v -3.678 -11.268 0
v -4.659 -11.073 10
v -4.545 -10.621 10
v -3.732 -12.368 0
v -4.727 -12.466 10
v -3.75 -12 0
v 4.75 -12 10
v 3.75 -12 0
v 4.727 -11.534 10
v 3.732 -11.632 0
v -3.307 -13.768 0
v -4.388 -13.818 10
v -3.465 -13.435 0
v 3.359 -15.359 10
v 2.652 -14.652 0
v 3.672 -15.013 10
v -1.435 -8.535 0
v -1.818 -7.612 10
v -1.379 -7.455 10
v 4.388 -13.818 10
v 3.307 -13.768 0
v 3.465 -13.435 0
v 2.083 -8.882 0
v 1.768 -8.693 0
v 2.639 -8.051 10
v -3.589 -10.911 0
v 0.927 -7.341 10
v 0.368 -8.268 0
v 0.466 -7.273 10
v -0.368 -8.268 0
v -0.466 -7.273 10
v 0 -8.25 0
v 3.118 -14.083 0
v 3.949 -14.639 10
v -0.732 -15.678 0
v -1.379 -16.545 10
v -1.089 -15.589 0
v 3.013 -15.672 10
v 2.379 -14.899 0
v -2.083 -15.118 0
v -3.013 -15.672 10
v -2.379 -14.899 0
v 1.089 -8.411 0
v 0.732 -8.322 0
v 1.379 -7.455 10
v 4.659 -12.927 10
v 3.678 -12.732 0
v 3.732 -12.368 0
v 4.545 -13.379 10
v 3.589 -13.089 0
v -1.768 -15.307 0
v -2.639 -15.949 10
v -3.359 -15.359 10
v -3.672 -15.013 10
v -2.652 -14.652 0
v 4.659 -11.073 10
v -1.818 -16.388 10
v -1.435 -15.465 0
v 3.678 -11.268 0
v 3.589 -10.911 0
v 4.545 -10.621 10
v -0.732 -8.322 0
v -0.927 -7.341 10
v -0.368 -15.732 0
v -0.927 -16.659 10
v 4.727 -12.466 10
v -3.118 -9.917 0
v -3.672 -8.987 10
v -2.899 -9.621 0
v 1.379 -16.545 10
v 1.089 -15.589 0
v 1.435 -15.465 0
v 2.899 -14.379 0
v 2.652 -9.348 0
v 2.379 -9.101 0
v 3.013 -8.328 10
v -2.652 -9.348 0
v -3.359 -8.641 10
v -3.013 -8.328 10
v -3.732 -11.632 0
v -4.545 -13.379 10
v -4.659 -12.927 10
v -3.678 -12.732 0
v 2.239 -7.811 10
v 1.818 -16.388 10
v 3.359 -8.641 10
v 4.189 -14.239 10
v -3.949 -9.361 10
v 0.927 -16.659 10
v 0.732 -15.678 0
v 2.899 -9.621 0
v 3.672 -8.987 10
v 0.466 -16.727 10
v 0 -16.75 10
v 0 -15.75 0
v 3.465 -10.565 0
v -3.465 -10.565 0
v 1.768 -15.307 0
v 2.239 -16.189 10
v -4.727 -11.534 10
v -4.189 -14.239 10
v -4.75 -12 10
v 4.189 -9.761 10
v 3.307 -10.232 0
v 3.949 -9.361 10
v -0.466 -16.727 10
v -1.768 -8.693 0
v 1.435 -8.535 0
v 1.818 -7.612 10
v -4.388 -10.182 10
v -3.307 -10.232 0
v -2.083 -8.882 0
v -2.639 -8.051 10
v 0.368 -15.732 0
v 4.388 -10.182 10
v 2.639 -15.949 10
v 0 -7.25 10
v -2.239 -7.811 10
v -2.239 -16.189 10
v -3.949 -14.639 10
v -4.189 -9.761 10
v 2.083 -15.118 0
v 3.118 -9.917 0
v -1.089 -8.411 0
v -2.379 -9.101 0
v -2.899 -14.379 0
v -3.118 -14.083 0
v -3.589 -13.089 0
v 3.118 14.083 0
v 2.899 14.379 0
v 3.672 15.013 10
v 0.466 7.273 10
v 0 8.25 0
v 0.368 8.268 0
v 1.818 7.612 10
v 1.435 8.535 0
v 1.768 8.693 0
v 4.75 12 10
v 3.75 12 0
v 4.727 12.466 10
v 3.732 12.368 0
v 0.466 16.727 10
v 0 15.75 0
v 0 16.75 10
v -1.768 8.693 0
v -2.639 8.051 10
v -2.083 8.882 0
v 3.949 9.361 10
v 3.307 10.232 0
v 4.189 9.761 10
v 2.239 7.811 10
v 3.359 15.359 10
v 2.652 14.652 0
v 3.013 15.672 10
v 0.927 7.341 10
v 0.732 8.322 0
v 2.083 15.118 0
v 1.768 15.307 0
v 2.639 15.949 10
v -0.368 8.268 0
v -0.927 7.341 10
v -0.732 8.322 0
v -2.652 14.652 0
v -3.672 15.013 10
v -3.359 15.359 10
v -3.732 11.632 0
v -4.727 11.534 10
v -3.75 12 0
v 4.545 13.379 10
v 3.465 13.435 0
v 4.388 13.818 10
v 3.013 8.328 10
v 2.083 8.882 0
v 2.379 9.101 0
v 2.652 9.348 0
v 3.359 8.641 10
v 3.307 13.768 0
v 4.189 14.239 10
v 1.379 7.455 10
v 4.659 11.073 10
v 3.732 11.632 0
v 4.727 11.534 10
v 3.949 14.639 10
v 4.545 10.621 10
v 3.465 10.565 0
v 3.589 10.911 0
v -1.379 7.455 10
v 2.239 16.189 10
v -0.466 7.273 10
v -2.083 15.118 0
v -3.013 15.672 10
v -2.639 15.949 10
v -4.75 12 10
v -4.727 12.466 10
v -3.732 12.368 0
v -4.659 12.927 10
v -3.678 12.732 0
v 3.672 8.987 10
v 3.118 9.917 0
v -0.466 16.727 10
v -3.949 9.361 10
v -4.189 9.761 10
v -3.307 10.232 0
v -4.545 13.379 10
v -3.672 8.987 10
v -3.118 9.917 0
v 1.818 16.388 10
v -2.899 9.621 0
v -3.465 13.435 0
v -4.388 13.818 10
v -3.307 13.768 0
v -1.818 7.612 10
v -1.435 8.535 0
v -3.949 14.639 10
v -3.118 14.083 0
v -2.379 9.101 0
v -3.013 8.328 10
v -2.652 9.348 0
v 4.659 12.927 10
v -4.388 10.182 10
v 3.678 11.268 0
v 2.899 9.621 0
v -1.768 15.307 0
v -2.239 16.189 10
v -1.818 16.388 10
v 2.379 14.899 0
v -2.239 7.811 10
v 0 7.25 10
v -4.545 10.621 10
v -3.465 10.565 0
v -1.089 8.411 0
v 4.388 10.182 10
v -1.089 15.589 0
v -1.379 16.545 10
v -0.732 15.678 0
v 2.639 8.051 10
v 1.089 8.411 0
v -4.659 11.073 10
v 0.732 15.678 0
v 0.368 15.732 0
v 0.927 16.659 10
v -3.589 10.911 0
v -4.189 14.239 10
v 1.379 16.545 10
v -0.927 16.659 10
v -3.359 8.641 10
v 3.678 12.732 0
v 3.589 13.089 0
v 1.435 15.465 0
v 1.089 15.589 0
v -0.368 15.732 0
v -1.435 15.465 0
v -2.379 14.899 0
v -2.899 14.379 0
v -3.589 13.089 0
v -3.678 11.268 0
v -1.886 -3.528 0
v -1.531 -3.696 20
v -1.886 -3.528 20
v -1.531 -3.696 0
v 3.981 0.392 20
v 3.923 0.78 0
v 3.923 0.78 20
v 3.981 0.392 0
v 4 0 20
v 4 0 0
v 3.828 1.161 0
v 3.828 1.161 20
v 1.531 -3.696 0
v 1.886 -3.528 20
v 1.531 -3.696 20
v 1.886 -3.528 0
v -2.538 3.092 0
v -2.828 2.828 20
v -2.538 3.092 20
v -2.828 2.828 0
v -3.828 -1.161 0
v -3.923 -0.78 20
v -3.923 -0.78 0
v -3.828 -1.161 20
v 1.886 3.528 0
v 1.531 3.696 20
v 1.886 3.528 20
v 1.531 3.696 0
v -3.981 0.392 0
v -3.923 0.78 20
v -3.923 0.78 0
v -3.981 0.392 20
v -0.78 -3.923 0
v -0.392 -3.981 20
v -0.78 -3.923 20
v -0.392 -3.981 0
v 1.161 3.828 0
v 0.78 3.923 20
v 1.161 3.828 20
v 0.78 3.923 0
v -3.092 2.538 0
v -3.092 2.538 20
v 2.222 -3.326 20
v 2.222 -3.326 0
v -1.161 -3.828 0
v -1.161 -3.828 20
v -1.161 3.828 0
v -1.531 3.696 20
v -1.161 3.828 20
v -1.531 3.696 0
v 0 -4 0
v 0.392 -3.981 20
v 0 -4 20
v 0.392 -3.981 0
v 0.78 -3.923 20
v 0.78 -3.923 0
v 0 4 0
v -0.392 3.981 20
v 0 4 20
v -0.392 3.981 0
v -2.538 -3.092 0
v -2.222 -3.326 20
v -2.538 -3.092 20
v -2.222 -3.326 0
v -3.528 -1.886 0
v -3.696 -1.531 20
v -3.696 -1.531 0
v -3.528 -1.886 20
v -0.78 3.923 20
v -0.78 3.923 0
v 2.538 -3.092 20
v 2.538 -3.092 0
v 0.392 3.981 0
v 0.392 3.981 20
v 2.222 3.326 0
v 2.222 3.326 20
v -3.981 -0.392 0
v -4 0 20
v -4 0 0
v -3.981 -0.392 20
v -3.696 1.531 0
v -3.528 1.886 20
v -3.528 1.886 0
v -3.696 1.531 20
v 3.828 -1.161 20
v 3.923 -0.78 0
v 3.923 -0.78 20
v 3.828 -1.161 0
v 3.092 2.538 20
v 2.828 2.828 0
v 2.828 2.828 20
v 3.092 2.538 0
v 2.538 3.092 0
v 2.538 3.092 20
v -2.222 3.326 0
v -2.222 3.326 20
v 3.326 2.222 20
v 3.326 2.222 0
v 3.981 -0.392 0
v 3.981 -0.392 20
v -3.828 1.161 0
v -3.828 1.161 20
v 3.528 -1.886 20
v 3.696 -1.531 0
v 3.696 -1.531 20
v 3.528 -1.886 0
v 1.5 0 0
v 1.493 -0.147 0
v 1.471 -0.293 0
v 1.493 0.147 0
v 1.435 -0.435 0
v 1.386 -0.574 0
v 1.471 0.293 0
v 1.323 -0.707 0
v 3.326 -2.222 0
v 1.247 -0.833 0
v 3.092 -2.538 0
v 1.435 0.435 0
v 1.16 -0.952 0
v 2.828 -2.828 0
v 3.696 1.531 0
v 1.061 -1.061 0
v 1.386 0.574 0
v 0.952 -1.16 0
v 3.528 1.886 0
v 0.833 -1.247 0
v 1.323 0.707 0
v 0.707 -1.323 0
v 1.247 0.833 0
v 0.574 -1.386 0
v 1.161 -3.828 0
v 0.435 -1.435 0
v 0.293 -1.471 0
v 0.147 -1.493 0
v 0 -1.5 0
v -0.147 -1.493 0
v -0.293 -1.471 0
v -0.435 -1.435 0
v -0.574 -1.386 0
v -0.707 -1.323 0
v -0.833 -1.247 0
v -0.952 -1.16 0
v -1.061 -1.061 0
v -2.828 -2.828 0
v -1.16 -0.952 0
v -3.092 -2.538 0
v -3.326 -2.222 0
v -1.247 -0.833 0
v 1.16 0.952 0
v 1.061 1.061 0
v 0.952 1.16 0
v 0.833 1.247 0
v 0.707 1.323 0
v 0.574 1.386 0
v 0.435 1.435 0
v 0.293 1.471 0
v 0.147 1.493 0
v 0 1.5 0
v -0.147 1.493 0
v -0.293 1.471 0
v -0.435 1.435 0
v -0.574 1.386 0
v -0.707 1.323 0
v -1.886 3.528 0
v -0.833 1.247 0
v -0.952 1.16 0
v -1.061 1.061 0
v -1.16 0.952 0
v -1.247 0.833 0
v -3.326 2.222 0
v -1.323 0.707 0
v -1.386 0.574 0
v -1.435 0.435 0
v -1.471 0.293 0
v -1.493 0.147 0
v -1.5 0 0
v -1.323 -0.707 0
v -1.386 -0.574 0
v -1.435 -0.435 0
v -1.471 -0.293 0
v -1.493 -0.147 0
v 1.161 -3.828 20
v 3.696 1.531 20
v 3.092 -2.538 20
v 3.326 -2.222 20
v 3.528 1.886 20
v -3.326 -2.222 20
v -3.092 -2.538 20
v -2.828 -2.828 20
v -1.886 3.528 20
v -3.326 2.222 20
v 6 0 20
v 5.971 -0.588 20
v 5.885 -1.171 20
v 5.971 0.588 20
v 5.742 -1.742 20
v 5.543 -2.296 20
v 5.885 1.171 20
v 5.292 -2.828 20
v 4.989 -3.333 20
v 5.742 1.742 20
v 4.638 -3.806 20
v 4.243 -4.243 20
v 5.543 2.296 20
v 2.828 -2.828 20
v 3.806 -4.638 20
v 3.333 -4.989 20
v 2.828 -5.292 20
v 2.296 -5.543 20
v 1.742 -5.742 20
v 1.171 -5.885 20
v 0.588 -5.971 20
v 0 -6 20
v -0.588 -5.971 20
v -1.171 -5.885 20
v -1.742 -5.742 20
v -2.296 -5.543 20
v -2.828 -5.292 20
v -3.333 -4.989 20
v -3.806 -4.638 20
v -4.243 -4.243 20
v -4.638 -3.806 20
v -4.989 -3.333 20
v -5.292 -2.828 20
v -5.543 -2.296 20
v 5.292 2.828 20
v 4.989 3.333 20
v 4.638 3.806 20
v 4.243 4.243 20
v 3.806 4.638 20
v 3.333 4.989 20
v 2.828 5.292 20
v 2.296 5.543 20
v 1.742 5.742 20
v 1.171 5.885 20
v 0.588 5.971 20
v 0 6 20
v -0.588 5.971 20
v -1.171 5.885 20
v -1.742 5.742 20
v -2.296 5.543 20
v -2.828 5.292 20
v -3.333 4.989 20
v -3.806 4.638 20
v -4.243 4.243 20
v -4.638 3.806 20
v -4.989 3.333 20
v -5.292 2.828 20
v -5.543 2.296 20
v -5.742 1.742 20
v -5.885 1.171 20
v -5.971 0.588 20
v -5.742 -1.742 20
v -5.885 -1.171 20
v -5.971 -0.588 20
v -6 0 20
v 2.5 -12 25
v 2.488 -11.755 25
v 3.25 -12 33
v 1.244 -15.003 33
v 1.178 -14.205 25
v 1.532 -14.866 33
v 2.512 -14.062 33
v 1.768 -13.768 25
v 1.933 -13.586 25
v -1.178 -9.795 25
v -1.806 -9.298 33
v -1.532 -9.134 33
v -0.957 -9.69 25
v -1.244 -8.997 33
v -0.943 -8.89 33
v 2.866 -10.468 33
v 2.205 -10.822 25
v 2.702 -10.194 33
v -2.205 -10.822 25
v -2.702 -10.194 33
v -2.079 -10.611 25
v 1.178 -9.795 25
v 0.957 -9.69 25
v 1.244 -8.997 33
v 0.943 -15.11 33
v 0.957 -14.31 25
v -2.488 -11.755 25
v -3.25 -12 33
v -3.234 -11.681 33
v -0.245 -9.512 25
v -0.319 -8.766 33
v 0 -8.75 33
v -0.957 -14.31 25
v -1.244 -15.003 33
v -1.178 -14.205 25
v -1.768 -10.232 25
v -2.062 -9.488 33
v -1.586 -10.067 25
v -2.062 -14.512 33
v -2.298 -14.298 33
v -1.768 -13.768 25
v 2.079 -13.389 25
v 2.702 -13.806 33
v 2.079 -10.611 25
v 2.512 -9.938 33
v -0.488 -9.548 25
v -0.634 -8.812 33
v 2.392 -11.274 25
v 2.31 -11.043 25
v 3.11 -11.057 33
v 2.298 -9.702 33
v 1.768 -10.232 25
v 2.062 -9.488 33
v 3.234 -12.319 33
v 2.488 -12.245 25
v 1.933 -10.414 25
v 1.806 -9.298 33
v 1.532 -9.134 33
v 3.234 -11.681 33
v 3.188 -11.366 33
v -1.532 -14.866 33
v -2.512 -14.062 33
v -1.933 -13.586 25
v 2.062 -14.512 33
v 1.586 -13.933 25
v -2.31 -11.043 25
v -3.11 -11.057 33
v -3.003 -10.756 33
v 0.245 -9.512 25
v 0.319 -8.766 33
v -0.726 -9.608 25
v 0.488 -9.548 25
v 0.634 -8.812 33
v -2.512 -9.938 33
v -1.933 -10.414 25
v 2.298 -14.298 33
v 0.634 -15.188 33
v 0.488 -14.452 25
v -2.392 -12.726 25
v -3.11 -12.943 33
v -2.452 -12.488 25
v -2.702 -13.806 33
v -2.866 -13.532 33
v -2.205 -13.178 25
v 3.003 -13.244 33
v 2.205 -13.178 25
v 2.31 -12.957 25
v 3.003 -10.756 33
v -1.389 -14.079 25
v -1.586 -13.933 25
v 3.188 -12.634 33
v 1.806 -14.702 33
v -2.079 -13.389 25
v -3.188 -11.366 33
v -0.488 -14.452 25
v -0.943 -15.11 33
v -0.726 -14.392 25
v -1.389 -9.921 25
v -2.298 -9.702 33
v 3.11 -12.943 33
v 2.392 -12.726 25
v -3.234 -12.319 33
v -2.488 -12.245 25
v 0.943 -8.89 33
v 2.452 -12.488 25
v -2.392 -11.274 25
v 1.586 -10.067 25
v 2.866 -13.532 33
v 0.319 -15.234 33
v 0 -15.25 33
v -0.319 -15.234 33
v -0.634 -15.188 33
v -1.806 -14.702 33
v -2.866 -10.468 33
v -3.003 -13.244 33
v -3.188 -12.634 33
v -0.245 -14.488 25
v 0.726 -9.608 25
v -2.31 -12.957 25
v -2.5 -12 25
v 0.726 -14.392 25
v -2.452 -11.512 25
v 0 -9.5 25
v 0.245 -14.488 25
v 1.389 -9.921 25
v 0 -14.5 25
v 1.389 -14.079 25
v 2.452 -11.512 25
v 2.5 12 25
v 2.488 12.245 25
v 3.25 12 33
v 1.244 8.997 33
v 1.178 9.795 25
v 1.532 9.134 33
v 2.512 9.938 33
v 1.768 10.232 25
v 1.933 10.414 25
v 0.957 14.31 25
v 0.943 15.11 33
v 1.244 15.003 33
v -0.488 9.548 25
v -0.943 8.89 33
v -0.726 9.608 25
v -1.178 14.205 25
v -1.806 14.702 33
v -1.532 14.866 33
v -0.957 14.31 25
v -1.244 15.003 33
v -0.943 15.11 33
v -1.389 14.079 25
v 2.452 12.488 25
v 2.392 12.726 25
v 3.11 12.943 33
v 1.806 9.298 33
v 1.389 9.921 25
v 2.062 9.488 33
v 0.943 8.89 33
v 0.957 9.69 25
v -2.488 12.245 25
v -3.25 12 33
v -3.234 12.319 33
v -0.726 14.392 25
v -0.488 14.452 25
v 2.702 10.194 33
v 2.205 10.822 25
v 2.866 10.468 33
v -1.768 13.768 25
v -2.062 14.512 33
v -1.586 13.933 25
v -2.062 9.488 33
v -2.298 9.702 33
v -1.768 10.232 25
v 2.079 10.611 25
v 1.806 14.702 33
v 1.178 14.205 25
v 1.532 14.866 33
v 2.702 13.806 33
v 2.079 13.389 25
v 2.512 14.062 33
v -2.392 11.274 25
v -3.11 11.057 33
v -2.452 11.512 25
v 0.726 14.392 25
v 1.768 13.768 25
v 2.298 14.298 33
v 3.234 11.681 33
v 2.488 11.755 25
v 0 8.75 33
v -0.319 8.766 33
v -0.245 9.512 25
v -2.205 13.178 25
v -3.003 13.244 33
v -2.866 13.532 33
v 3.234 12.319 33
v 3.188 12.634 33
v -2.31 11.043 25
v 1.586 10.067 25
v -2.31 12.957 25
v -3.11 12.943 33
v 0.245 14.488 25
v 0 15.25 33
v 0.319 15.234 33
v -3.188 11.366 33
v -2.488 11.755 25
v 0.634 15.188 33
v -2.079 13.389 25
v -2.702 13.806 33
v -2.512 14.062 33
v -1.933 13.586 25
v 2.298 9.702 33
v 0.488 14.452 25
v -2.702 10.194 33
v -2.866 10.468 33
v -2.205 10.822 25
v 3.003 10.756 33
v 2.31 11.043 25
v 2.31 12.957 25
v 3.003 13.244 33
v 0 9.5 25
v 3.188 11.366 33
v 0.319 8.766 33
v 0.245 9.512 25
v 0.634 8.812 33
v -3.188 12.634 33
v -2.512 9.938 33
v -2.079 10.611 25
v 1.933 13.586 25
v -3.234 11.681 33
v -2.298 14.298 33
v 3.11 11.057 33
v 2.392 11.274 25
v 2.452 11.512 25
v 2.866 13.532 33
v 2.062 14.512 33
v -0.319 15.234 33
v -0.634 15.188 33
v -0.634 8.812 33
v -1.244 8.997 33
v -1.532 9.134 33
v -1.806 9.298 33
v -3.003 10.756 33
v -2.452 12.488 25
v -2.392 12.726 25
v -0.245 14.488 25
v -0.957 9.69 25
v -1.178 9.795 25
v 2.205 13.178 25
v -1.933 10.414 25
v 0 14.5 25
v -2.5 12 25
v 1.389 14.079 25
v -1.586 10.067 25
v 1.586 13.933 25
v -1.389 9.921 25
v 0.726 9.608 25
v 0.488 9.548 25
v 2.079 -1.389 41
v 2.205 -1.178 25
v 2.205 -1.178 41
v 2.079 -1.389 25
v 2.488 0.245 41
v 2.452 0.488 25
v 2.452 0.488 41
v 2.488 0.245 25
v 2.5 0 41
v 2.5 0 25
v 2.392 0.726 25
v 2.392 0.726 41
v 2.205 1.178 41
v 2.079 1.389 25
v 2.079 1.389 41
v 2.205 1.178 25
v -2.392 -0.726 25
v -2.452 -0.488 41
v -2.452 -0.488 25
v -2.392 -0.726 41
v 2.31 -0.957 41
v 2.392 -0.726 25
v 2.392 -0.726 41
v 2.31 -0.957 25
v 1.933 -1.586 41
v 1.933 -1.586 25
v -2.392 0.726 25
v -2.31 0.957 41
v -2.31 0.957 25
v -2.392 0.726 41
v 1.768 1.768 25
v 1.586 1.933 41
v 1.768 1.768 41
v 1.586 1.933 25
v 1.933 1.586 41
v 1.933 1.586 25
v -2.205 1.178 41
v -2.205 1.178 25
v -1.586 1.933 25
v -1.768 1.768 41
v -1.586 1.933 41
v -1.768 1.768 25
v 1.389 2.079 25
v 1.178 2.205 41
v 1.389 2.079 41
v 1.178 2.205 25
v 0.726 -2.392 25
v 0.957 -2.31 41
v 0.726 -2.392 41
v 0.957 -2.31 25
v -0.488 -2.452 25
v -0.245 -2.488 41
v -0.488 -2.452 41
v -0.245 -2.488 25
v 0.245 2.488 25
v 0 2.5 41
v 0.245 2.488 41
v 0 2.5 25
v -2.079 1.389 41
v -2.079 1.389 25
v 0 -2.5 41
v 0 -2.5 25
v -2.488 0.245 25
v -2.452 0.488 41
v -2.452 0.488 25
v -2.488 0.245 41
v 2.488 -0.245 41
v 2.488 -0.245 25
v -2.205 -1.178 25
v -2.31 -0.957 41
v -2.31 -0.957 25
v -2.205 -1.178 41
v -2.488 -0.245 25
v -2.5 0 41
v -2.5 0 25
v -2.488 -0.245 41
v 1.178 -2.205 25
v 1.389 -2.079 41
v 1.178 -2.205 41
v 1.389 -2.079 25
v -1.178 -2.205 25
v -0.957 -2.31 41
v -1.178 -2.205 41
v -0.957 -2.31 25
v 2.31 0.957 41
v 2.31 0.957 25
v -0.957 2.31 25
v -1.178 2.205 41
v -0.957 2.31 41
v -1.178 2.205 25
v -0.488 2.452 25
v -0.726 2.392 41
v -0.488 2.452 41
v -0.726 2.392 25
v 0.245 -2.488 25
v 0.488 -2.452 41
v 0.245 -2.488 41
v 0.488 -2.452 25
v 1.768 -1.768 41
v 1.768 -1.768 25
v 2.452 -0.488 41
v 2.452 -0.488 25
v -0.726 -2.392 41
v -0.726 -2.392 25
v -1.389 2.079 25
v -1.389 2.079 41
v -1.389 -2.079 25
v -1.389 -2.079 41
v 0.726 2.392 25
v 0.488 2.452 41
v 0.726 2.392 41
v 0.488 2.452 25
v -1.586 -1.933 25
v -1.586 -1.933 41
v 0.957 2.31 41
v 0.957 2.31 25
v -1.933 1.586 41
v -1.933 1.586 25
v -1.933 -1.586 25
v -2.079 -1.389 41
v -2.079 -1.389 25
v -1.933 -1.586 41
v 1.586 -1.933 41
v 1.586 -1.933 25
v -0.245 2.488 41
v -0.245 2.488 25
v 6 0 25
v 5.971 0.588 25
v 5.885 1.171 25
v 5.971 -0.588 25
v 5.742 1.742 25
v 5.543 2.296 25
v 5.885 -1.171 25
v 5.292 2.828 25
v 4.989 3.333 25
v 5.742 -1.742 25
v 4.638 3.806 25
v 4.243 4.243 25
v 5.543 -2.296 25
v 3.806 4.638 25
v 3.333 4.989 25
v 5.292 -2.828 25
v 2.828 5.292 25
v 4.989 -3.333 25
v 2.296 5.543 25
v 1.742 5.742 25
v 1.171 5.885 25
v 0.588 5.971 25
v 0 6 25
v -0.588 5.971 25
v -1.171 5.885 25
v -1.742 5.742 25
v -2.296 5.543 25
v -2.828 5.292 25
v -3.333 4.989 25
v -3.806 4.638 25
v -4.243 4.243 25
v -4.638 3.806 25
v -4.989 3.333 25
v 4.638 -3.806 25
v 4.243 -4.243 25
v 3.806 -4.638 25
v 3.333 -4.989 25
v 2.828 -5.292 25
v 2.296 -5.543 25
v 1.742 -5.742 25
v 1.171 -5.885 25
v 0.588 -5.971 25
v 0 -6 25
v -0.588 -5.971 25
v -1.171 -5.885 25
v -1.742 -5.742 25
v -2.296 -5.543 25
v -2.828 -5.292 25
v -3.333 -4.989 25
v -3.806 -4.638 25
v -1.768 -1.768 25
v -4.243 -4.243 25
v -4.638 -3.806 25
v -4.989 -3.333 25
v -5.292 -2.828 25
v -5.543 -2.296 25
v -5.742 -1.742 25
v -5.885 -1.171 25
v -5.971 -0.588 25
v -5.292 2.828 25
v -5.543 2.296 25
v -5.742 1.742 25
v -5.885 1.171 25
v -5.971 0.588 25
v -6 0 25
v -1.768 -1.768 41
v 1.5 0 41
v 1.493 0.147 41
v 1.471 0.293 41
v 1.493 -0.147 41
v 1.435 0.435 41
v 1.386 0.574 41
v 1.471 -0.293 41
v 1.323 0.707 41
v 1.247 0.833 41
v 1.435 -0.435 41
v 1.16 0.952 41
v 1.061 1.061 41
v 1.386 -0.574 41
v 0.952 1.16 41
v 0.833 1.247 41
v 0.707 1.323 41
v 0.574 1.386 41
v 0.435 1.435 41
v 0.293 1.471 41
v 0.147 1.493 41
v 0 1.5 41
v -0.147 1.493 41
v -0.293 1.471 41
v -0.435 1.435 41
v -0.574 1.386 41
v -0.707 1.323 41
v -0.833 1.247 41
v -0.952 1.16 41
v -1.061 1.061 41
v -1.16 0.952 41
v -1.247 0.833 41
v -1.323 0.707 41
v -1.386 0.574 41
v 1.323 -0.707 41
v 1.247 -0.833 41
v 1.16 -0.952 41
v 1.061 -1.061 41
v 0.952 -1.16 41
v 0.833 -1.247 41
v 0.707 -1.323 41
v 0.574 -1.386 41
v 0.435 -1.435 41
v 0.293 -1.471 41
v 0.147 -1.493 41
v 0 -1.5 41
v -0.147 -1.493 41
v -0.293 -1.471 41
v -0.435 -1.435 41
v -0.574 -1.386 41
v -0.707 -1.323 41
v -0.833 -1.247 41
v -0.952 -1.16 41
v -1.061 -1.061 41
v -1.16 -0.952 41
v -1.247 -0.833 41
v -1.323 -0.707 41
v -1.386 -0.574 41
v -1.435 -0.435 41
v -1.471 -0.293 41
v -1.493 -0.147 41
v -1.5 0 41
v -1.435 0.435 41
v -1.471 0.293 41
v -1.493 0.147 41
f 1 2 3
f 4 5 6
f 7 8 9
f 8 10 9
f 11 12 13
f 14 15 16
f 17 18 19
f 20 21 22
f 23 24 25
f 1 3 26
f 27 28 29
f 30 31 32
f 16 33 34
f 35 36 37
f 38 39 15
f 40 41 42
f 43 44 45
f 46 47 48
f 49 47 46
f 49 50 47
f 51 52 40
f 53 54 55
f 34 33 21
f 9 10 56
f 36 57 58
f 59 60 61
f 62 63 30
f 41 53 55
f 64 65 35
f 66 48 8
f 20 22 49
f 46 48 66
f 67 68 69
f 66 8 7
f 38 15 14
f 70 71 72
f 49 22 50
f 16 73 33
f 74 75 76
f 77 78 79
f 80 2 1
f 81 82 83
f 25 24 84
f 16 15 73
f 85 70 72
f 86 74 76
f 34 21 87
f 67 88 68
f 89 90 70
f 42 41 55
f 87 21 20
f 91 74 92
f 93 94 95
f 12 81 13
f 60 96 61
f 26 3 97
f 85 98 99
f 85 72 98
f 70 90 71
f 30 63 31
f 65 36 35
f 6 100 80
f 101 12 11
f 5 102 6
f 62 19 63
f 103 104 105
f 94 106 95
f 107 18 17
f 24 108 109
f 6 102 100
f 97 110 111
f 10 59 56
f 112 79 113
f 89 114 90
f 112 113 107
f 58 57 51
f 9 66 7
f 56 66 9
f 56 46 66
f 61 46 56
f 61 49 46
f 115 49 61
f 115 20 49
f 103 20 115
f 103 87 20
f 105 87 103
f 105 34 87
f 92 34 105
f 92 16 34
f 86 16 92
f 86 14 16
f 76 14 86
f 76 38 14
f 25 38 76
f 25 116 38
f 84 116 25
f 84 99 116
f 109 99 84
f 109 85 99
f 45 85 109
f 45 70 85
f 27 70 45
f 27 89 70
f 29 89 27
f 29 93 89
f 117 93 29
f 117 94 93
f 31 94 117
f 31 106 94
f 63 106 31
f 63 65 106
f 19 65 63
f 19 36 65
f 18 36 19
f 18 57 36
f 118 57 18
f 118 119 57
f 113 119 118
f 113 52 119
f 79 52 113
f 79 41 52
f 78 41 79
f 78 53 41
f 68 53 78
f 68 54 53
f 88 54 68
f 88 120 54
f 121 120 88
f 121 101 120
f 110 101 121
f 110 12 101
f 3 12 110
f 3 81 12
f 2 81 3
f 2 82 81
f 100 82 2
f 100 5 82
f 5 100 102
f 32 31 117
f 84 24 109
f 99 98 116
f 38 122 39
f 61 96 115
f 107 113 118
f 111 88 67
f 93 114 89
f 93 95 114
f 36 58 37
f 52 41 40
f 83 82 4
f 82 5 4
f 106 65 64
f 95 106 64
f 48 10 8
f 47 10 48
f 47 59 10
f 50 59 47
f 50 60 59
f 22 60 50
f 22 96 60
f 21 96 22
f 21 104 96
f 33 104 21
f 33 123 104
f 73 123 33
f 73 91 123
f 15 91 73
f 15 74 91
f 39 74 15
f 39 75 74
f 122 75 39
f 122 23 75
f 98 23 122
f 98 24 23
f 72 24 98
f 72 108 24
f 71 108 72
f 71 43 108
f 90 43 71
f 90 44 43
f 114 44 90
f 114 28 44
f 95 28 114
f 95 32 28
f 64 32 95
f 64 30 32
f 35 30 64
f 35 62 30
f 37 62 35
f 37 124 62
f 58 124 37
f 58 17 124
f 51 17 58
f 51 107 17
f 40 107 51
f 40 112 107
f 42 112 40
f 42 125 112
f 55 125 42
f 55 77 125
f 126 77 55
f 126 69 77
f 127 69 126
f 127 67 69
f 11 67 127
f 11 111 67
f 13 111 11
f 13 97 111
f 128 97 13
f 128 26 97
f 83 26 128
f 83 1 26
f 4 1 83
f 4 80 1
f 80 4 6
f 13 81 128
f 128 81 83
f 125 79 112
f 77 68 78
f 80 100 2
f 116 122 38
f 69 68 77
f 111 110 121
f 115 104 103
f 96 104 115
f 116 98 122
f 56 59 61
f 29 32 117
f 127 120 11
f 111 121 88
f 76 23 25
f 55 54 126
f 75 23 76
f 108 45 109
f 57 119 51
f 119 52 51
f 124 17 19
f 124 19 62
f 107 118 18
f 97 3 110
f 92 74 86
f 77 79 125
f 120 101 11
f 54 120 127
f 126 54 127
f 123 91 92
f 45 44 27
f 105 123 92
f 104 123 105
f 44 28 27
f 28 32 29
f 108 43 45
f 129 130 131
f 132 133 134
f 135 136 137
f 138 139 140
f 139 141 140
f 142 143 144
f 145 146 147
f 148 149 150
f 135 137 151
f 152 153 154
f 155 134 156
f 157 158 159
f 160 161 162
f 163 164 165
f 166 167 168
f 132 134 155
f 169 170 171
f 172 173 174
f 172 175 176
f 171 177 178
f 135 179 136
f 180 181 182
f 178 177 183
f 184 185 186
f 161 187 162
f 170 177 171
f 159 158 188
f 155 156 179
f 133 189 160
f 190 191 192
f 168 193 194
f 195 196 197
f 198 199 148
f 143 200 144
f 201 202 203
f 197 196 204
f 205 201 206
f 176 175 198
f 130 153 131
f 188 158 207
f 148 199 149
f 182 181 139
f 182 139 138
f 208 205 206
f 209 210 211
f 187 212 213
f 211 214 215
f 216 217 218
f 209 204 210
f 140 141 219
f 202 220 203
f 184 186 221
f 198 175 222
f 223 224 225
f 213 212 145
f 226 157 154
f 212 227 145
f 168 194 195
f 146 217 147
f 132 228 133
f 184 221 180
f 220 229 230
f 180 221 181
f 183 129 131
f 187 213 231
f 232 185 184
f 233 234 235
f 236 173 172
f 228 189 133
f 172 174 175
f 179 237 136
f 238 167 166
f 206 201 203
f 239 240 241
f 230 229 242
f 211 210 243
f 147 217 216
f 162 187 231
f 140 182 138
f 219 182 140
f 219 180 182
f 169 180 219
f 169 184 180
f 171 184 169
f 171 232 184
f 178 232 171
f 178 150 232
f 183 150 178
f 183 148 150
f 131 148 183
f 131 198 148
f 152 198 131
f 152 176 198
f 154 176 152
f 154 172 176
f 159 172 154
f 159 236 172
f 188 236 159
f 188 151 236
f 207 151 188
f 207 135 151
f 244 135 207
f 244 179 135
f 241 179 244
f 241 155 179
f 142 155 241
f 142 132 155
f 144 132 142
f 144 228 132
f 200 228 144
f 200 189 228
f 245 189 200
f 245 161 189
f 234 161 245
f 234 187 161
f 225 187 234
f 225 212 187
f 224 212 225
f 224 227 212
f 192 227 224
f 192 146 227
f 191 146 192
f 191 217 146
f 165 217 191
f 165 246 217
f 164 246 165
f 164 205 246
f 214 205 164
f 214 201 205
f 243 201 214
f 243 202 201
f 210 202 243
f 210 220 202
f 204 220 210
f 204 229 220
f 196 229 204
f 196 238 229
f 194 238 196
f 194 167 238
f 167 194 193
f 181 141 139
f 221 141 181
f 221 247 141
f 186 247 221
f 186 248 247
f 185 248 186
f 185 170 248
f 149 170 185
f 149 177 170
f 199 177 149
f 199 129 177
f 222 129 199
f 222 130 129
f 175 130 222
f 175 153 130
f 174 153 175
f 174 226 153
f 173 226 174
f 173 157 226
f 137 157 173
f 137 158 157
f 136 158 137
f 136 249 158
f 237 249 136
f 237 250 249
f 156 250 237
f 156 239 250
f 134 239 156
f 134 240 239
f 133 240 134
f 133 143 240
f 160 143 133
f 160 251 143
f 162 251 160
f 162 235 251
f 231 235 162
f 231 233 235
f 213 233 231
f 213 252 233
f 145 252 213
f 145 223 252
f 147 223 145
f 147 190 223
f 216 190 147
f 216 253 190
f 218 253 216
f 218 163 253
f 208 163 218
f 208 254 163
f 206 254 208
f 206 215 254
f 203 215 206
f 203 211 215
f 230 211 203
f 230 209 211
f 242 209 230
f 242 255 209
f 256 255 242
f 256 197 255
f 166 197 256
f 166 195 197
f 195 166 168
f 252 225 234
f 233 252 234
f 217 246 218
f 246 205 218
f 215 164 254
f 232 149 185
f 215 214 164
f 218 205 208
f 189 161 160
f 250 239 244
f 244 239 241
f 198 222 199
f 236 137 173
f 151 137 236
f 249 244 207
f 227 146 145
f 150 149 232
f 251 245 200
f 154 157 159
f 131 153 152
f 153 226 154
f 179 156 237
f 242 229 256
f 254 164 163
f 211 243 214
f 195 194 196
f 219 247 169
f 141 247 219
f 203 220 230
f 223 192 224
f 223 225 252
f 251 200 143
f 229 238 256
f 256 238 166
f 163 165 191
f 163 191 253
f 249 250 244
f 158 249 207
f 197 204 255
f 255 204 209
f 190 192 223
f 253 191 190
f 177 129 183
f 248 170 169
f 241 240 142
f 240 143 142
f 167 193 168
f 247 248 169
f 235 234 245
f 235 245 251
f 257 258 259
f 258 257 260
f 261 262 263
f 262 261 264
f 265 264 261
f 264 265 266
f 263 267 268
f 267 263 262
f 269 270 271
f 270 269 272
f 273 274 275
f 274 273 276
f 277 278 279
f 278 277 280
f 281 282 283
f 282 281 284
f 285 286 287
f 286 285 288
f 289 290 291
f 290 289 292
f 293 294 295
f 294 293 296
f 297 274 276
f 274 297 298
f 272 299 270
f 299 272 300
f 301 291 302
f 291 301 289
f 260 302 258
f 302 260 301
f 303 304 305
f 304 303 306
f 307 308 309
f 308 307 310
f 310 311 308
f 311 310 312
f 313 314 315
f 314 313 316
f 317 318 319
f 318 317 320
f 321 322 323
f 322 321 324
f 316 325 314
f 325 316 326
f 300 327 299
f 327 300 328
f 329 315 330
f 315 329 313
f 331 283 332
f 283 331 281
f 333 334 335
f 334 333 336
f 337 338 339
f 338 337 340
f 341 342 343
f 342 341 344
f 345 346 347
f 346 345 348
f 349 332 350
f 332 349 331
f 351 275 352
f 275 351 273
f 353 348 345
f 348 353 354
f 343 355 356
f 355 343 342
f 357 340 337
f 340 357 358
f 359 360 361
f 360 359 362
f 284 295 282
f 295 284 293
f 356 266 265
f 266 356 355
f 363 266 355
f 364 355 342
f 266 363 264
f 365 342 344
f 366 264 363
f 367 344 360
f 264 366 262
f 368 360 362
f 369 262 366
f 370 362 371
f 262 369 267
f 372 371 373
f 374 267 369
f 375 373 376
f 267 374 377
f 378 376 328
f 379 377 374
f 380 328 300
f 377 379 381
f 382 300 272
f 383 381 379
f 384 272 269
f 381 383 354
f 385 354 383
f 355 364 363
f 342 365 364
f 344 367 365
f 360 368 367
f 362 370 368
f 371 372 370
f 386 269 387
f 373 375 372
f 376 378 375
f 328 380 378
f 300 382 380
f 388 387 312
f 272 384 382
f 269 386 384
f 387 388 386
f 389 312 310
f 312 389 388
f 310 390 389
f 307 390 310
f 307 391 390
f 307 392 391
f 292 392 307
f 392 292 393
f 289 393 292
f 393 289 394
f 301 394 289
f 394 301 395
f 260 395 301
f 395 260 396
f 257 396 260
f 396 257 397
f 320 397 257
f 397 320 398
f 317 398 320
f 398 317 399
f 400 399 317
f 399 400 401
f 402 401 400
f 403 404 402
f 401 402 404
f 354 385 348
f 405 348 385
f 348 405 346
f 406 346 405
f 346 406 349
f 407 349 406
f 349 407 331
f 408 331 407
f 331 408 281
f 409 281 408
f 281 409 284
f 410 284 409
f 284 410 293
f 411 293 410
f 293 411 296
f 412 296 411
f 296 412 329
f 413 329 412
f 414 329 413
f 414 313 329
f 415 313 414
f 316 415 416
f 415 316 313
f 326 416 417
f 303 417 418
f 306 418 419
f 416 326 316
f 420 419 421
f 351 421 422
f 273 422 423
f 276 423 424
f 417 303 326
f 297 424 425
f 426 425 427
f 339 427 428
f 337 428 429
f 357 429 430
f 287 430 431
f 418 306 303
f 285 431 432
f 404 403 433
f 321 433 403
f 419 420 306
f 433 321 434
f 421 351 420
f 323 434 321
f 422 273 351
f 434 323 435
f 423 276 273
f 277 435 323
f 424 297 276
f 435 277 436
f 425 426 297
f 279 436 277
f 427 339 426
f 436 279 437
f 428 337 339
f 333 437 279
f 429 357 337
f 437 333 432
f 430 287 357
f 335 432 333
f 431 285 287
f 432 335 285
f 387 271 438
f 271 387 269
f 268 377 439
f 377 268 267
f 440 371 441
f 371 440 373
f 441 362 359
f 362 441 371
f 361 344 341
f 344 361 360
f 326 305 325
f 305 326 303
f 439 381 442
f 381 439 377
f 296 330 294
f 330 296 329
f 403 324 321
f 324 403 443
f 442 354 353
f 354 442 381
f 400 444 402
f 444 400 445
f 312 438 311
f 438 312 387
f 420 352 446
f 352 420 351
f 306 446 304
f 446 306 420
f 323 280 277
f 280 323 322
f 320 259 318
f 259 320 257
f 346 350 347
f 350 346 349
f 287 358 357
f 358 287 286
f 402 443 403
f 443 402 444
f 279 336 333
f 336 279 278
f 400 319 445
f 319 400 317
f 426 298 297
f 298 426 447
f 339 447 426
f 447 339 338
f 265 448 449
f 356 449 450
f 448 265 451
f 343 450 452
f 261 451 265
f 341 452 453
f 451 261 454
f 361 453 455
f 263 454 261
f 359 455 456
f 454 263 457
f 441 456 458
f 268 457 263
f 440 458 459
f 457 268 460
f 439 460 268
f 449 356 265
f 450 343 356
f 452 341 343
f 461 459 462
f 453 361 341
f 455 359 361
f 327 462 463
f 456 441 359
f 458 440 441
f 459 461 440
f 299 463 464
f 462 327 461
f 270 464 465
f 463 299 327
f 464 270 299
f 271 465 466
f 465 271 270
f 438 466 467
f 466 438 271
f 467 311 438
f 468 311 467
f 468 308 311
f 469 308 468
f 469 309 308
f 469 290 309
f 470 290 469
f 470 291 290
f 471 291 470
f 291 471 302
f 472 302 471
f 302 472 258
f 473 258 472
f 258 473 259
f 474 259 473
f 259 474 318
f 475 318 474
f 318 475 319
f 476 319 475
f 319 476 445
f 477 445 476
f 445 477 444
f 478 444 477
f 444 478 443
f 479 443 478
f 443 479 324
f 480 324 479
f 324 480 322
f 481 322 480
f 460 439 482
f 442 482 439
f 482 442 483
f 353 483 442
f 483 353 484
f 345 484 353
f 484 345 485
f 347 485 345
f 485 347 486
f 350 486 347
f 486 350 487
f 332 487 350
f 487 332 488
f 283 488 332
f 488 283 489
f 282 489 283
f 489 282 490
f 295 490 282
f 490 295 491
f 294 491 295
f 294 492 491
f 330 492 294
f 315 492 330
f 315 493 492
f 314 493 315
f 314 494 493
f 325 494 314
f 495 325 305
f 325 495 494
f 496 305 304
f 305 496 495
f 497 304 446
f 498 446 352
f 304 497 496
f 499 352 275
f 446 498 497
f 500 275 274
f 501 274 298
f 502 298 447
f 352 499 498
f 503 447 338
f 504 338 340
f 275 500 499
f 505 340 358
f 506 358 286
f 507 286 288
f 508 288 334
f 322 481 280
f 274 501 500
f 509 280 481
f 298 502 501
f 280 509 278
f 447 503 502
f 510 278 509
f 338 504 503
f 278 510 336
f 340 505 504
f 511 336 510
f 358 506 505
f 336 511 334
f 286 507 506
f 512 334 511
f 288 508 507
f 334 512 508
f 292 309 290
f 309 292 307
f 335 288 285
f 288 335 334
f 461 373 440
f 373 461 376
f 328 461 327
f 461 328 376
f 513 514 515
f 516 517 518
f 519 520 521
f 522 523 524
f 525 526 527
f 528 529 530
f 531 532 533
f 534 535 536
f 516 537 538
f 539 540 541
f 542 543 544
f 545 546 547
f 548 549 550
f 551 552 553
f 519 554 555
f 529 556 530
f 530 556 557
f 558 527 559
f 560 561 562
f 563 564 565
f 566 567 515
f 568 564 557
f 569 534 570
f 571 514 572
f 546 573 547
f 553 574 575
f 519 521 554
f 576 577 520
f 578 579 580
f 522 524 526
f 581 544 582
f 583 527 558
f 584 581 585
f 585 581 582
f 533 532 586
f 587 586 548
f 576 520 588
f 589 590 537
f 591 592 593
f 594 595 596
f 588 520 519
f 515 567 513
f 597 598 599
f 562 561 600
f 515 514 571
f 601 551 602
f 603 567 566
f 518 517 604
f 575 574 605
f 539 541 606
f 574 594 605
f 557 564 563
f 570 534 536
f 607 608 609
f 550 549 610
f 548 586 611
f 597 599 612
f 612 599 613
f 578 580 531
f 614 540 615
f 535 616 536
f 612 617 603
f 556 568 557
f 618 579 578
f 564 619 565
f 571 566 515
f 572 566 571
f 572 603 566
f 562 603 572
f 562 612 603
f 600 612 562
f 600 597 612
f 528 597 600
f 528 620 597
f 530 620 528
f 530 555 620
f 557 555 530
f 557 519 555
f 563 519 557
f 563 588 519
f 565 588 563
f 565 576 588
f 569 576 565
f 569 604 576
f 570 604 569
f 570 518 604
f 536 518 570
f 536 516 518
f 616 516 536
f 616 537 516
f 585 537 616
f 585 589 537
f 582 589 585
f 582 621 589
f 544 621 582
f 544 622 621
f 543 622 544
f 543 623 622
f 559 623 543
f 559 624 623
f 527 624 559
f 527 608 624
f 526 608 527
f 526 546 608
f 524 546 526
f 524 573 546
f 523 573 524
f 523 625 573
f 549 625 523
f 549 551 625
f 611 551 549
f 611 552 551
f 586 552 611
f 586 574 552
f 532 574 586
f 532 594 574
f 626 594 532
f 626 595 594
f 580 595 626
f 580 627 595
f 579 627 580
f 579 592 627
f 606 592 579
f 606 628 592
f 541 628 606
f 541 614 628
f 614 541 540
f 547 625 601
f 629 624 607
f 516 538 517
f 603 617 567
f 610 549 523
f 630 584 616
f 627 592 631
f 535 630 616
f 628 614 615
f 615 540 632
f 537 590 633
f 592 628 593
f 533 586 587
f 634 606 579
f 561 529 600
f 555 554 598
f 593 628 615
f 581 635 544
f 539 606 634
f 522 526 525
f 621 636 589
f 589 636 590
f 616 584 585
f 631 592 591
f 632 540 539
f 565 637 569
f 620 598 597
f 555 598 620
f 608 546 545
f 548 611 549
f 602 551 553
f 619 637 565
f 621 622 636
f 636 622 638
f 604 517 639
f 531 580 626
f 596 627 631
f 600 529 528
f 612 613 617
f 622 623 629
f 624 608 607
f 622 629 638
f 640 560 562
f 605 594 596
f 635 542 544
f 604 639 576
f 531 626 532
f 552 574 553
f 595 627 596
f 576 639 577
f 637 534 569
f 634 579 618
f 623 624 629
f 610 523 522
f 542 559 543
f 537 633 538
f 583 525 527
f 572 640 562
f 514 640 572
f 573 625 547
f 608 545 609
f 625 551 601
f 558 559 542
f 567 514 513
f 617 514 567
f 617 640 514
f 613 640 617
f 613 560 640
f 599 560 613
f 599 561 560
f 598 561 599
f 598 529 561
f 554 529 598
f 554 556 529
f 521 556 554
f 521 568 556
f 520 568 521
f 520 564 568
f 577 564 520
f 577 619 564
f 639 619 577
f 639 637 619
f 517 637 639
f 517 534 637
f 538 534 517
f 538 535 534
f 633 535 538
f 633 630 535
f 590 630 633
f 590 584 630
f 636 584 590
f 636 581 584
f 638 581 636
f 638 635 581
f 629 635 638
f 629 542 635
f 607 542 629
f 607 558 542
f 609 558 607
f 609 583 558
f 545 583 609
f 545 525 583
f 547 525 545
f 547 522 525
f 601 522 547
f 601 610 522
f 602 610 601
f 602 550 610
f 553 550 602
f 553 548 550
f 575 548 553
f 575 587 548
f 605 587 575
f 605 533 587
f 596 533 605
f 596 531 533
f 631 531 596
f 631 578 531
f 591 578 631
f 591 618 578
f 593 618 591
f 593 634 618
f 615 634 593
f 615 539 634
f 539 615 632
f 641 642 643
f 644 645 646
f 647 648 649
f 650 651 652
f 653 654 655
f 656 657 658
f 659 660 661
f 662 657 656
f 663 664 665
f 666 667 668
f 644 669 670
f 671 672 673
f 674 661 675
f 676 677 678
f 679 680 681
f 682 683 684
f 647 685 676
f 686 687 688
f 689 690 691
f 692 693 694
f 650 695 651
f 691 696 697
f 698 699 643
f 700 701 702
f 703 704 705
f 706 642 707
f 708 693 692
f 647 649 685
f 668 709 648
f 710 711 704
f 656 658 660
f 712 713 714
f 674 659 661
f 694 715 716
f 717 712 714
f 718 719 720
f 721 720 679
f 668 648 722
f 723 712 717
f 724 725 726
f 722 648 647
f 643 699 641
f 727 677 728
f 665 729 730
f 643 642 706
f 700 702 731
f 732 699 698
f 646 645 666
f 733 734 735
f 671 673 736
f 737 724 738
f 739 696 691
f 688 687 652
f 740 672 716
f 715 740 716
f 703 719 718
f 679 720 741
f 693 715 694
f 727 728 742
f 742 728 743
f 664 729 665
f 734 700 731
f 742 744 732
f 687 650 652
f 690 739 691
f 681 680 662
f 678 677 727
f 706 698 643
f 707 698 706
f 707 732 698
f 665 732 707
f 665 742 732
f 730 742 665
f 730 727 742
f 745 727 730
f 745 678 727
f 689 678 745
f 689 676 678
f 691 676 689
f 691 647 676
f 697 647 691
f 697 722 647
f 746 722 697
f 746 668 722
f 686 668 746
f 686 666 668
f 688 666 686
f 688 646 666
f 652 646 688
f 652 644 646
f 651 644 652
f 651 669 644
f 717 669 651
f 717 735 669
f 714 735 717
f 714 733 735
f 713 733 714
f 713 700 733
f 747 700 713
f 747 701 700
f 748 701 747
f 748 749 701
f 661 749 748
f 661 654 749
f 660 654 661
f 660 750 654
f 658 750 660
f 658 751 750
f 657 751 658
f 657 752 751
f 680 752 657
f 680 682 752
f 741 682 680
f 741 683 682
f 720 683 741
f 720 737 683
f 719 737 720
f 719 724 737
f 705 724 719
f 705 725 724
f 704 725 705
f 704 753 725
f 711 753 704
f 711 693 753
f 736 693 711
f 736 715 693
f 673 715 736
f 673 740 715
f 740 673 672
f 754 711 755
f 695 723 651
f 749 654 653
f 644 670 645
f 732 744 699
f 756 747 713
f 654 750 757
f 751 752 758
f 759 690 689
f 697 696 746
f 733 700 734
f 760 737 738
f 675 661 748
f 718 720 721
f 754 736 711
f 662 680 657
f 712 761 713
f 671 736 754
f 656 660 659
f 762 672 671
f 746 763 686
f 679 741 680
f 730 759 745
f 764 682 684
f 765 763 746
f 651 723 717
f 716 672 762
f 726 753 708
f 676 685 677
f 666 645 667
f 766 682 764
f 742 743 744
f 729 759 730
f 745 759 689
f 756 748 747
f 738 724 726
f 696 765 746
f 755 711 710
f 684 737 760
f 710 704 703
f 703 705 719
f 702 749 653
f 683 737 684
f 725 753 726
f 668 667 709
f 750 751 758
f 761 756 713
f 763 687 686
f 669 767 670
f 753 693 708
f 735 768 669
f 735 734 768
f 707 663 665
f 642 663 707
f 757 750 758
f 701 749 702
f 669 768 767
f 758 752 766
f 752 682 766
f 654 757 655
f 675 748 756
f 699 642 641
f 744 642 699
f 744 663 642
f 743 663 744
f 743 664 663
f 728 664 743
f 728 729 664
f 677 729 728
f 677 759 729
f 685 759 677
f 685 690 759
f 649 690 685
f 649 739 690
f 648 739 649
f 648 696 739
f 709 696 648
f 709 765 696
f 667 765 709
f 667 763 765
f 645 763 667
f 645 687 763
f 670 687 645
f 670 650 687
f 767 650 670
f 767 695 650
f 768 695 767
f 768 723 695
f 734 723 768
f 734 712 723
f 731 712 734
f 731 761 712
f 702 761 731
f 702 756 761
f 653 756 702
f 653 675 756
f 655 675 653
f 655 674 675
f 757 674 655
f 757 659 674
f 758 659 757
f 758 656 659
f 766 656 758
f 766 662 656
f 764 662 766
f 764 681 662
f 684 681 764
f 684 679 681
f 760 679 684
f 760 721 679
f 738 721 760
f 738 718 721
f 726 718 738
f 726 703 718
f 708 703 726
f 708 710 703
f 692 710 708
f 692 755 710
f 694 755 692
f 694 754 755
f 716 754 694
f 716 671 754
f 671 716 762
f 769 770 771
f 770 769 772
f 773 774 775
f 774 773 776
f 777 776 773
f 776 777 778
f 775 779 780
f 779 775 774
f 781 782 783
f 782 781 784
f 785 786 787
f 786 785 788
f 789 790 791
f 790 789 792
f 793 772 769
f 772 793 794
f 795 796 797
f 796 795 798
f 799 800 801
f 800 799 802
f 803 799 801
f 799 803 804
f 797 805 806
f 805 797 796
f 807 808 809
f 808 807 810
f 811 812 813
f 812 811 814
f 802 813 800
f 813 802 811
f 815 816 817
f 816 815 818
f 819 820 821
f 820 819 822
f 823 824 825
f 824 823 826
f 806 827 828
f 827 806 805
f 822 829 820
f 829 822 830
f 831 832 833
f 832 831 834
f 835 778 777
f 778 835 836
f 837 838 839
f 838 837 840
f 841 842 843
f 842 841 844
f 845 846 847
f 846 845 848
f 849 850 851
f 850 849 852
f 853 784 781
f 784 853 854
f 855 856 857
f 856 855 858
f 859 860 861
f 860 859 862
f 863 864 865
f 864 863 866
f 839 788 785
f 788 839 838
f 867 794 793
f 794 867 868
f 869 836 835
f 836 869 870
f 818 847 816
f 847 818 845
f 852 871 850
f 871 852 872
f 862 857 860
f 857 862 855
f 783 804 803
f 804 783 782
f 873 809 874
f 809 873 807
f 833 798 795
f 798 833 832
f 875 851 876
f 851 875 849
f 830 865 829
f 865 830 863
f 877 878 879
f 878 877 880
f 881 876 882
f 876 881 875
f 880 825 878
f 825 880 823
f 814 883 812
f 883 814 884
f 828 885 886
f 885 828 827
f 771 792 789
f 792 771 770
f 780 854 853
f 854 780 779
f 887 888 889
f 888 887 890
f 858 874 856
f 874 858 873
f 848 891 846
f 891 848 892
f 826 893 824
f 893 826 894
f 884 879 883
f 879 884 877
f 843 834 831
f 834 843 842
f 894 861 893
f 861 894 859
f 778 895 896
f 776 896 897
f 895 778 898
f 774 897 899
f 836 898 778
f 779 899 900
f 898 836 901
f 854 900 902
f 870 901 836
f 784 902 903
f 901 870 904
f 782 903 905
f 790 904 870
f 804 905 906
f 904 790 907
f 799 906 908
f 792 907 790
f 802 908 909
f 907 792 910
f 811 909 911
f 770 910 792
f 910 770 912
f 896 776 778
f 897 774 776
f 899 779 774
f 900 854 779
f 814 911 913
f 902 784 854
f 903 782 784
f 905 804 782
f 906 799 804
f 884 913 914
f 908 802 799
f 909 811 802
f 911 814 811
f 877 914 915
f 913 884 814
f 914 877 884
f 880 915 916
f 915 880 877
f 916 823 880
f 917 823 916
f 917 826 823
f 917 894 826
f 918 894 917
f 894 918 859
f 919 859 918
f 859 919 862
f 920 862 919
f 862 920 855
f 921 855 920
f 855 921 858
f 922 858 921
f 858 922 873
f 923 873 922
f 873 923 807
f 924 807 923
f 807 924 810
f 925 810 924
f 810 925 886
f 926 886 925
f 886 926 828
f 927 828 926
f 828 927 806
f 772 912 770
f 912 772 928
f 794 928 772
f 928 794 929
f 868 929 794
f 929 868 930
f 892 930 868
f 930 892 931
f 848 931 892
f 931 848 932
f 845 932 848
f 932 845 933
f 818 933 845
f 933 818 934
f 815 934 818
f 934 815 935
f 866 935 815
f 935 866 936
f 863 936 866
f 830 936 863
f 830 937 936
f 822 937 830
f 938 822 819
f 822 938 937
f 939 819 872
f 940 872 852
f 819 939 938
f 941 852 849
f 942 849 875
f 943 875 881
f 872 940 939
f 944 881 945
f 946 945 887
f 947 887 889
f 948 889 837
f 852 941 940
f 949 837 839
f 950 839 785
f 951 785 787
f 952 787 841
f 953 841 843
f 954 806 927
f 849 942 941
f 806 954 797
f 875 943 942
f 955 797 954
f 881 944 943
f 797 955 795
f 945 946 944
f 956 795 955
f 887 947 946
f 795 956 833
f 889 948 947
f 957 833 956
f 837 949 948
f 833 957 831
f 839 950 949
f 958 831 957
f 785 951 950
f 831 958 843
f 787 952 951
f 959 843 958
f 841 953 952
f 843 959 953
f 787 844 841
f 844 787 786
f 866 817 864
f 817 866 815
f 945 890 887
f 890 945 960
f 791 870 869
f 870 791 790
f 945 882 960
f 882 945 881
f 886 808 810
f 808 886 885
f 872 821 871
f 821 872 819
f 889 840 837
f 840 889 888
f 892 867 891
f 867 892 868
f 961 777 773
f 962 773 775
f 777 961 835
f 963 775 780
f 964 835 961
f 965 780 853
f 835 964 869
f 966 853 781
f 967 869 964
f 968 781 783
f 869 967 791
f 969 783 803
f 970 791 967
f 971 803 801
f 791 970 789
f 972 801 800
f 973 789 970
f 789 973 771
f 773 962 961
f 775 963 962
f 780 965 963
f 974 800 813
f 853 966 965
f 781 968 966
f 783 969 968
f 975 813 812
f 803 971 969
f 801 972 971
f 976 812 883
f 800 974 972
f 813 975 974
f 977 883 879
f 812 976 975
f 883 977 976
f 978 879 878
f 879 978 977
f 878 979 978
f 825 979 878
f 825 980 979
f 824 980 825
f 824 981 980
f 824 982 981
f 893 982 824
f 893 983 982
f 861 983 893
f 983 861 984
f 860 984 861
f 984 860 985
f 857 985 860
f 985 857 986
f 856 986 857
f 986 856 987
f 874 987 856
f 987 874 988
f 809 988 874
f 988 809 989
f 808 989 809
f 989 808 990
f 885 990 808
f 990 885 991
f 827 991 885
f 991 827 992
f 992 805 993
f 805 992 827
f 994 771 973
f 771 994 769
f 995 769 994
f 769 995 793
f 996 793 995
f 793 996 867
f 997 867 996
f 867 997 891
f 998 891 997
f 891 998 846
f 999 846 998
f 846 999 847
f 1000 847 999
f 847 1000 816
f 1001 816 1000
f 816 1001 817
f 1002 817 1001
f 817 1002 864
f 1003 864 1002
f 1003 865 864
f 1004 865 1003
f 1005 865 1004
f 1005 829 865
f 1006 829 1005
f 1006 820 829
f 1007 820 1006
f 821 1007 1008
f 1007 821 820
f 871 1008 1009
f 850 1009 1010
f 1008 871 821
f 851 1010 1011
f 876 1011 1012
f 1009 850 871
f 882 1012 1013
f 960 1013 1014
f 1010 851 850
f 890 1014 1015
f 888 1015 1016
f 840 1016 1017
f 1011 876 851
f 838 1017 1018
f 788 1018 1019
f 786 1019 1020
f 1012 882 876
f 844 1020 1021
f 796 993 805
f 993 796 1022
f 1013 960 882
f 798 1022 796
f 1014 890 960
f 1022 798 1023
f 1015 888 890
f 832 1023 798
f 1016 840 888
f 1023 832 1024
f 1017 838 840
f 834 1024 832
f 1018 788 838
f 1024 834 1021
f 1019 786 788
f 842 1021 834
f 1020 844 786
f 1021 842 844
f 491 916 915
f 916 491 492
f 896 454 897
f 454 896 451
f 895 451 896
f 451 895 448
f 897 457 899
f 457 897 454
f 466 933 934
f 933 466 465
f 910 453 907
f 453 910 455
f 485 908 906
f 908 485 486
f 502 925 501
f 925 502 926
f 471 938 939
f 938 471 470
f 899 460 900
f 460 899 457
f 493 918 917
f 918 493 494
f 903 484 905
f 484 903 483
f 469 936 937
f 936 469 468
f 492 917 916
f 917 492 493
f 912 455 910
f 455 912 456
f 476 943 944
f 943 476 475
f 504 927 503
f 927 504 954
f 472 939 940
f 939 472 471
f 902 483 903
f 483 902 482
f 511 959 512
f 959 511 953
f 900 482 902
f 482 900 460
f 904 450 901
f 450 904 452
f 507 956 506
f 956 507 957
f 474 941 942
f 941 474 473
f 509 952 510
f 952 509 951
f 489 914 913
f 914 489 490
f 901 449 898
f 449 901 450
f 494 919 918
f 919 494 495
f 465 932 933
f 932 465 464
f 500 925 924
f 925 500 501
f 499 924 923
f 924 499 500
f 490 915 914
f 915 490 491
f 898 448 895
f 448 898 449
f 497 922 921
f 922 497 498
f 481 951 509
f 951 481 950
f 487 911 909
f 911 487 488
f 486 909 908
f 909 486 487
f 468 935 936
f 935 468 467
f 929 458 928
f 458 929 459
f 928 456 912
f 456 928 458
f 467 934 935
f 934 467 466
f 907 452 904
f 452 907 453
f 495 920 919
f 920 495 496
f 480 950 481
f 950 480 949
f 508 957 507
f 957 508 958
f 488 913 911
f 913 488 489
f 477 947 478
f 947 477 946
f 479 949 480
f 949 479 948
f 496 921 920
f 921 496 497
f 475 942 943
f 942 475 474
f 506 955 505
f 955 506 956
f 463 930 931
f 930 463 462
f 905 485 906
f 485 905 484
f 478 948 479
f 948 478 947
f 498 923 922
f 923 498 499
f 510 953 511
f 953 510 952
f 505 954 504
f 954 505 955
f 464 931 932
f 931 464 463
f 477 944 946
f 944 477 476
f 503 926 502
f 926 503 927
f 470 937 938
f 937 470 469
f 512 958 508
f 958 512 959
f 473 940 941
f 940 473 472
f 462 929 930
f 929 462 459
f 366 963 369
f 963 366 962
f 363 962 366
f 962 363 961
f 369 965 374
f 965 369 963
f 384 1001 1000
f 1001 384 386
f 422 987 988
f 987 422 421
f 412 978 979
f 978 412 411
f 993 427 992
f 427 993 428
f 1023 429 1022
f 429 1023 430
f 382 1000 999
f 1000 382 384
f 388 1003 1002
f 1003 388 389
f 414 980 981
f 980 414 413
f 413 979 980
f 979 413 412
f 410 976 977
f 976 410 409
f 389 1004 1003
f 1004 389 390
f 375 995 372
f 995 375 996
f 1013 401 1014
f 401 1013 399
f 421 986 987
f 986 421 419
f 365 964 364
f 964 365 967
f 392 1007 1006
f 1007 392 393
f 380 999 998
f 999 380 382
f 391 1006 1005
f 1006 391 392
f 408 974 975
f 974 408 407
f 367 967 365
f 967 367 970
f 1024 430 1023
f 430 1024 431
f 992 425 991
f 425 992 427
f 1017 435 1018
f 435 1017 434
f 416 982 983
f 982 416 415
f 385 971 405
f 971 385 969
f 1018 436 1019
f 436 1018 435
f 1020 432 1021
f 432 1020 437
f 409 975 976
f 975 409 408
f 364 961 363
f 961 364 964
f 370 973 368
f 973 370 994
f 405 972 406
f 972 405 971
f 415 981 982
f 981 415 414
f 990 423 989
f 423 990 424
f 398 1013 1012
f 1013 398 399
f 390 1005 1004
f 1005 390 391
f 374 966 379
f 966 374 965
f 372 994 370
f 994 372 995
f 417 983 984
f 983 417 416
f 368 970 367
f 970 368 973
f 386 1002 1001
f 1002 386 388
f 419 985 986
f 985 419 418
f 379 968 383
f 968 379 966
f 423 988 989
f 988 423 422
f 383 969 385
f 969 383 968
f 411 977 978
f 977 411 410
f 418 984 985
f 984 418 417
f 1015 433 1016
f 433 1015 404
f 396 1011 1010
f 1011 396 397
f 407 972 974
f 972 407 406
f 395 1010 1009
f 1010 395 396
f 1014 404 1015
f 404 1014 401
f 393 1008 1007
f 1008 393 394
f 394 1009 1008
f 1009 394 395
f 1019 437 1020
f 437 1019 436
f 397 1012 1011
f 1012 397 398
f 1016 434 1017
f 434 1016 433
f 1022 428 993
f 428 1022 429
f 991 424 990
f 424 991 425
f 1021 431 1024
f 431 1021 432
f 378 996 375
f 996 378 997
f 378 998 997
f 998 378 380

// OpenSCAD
// Straight hose-barb reducer
// 8 mm tubing (z = 0..20) -> 5 mm tubing (z = 25..41)
// Print orientation: standing upright along +Z, centred on the origin in X/Y.
// Units: mm. Bore: 3 mm through full length.

$fn = 64;

// ---- Dimensions ----
tube_od      = 8;    // 8 mm tubing outer diameter (no wall specified)
tube_id      = 5;    // 5 mm tubing inner diameter (no wall specified)
barb_h8      = 10;   // height of each 8 mm barb
barb_h5      = 8;    // height of each 5 mm barb
barb_base7   = 7.5;  // outer diameter of 8 mm barbs at their bottom
barb_top9    = 9.5;  // outer diameter of 8 mm barbs at their top
barb_top6    = 6.5;  // outer diameter of 5 mm barbs at their top
barb_bot5    = 5.0;  // outer diameter of 5 mm barbs at their bottom
collar_d     = 12;   // diameter of the z = 20..25 collar
bore_d       = 3;    // through-bore diameter
eps          = 0.5;  // overshoot for clean boolean cuts

// ---- Model ----
difference() {
    union() {
        // 8 mm tubing section with two stacked barbs
        translate([0, 0, 0]) {
            cylinder(h = 20, d = tube_od);
            for (s = [-1, 1])
                translate([0, s * 12, 0])
                    cylinder(h = barb_h8, d1 = barb_base7, d2 = barb_top9);
        }

        // 5 mm tubing section with two stacked barbs
        translate([0, 0, 25]) {
            cylinder(h = 16, d = tube_id);
            for (s = [-1, 1])
                translate([0, s * 12, 0])
                    cylinder(h = barb_h5, d1 = barb_bot5, d2 = barb_top6);
        }

        // Cylindrical collar (z = 20..25)
        translate([0, 0, 20])
            cylinder(h = 5, d = collar_d);
    }

    // 3 mm through-bore
    translate([0, 0, -eps])
        cylinder(h = 42, d = bore_d);
}
